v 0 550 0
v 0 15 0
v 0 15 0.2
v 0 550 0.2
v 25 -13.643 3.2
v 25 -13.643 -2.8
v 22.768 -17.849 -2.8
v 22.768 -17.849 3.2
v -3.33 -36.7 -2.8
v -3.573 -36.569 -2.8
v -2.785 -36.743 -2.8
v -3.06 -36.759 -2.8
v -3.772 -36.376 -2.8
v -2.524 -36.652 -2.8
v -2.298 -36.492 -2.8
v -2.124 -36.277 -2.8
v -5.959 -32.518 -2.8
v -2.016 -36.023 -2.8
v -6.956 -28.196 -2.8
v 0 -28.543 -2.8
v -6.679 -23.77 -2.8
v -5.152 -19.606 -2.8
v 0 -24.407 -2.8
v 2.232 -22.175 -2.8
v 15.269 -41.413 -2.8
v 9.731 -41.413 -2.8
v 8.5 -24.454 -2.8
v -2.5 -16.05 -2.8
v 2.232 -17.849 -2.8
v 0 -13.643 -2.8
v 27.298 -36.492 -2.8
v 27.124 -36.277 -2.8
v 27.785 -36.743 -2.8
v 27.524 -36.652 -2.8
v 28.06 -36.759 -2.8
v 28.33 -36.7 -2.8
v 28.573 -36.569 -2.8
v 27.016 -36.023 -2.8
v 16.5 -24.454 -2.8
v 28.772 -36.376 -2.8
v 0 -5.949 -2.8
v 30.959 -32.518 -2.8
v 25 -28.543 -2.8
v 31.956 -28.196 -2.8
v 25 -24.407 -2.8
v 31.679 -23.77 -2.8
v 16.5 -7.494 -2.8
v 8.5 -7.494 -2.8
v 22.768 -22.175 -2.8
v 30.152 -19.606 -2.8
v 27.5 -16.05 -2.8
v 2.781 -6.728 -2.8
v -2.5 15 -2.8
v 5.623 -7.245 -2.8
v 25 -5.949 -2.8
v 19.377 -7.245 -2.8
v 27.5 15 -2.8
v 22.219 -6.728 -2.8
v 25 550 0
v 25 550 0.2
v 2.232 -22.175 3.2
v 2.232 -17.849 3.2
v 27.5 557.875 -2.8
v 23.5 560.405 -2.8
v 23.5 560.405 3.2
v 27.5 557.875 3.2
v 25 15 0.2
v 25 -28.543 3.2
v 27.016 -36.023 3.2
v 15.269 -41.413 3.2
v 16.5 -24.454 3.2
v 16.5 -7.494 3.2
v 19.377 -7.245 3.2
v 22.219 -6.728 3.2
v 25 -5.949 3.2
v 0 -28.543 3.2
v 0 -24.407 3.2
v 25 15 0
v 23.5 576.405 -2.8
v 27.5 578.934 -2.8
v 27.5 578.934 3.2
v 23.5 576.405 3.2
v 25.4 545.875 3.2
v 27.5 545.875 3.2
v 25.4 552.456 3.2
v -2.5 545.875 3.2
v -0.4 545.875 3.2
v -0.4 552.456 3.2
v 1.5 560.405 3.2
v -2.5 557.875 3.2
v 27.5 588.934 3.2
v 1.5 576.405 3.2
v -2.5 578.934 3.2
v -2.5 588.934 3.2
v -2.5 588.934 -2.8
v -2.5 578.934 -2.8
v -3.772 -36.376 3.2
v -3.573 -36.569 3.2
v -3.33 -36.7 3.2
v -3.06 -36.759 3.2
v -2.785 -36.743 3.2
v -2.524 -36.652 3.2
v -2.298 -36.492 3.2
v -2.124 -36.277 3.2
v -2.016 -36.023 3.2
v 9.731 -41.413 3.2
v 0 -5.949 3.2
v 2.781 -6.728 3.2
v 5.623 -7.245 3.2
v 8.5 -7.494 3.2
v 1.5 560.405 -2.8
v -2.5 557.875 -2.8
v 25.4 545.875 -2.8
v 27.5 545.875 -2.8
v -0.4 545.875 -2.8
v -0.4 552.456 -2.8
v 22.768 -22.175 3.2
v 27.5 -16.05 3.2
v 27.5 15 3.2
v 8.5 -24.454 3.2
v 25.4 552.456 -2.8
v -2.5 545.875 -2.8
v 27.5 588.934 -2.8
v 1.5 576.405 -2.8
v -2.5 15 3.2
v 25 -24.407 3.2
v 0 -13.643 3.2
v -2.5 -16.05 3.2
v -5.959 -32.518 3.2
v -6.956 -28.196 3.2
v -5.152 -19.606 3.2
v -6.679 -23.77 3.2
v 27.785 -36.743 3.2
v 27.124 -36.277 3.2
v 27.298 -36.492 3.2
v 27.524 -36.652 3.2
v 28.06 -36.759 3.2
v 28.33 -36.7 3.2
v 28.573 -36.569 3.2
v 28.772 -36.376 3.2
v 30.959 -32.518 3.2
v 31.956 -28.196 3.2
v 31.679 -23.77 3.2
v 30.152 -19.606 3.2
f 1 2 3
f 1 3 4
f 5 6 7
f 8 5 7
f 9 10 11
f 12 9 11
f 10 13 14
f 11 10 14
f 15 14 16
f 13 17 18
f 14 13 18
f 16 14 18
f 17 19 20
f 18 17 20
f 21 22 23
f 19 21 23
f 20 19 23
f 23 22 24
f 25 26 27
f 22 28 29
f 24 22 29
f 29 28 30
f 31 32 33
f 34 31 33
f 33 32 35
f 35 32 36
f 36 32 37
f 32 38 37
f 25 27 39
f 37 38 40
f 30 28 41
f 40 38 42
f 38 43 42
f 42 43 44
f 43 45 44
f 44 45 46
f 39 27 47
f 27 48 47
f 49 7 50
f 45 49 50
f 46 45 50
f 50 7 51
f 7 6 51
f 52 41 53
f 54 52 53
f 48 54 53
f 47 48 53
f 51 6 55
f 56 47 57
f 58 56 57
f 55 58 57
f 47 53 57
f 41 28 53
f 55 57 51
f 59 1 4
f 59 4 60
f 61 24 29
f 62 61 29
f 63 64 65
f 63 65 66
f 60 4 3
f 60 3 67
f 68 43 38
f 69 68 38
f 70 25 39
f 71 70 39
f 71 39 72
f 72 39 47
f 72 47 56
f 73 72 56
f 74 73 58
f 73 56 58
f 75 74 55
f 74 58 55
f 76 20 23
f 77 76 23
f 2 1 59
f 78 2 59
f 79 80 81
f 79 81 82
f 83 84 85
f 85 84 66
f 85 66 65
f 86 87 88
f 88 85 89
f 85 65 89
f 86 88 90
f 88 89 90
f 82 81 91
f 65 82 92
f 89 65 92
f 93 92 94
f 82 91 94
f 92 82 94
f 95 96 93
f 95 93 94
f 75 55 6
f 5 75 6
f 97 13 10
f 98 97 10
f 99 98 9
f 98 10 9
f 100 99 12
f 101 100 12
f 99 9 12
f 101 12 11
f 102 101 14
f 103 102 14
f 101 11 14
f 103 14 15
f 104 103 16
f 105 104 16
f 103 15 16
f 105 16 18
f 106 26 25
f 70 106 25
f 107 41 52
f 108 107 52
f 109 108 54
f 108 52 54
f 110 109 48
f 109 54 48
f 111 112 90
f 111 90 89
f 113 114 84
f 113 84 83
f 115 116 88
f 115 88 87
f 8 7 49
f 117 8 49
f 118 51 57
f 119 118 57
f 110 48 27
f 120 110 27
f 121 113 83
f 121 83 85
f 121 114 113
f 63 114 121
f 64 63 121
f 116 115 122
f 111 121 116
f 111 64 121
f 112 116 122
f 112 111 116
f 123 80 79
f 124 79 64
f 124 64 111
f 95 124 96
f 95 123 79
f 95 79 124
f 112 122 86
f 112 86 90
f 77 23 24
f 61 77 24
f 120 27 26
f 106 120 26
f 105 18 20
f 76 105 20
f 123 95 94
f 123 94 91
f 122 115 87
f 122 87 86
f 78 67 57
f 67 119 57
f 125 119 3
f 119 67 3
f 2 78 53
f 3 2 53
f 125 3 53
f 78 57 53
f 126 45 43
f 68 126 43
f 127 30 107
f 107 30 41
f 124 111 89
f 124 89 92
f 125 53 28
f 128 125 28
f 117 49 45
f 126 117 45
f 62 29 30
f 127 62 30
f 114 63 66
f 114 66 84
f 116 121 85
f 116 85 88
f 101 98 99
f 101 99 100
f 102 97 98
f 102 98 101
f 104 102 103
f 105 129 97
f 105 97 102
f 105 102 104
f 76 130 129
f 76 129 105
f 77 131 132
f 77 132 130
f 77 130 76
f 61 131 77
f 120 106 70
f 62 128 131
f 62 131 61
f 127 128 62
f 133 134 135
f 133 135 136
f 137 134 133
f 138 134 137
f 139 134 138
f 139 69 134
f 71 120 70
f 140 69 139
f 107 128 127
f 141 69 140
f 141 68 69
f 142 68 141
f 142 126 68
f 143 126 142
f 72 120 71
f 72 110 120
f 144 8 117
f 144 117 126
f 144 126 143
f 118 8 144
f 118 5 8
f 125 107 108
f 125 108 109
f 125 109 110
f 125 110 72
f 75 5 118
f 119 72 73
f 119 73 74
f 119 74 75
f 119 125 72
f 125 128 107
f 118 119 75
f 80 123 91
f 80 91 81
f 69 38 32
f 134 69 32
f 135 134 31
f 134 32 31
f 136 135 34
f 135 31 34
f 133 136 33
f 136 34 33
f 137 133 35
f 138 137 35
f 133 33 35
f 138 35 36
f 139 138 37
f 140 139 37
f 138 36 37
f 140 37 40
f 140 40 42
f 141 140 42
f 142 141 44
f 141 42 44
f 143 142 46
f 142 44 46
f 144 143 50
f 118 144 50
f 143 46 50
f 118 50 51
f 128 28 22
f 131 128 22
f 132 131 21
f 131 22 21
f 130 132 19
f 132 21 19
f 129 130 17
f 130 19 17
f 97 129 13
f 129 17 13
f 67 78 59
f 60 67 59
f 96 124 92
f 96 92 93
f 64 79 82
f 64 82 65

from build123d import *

# Parameters (mm, degrees)
ESQUISSE1_W           = 25
ESQUISSE1_H           = 550
EXTRUSION1_DEPTH      = 0.2
EXTRUSION2_DEPTH      = 3
EXTRUSION2_DEPTH_BACK = 3
EXTRUSION3_DEPTH      = 3
EXTRUSION3_DEPTH_BACK = 3


with BuildPart() as part:
    # Esquisse1 → Extrusion1 (new body)
    with BuildSketch(Plane.XY):
        with Locations((12.5, 275)):
            Rectangle(ESQUISSE1_W, ESQUISSE1_H)
    extrude(amount=EXTRUSION1_DEPTH)

    # Esquisse3 → Extrusion3 (add, two sides: drawn at the far end of the back side and taken through both)
    with BuildSketch(Plane.XY.offset(0.2).offset(-EXTRUSION3_DEPTH_BACK)):
        with BuildLine():
            Line((-2.5, 15), (-2.5, -16.050493534))
            ThreePointArc((-2.5, -16.050493534), (-6.978018175, -25.972905965), (-3.771522068, -36.376044816))
            ThreePointArc((-3.771522068, -36.376044816), (-2.784540643, -36.74292693), (-2.016270834, -36.022860045))
            Line((-2.016270834, -36.022860045), (0, -28.543432251))
            Line((0, -28.543432251), (0, -24.40673249))
            Line((0, -24.40673249), (2.231996633, -22.174735857))
            Line((2.231996633, -22.174735857), (2.231996633, -17.848828872))
            Line((2.231996633, -17.848828872), (0, -13.643085971))
            Line((0, -13.643085971), (0, -5.949496262))
            ThreePointArc((0, -5.949496262), (4.195848556, -7.019821856), (8.5, -7.494187032))
            Line((8.5, -7.494187032), (8.5, -24.453508065))
            Line((8.5, -24.453508065), (9.730786536, -41.412829098))
            Line((9.730786536, -41.412829098), (15.269213464, -41.412829098))
            Line((15.269213464, -41.412829098), (16.5, -24.453508065))
            Line((16.5, -24.453508065), (16.5, -7.494187032))
            ThreePointArc((16.5, -7.494187032), (20.804151444, -7.019821856), (25, -5.949496262))
            Line((25, -5.949496262), (25, -13.643085971))
            Line((25, -13.643085971), (22.768003367, -17.848828872))
            Line((22.768003367, -17.848828872), (22.768003367, -22.174735857))
            Line((22.768003367, -22.174735857), (25, -24.40673249))
            Line((25, -24.40673249), (25, -28.543432251))
            Line((25, -28.543432251), (27.016270834, -36.022860045))
            ThreePointArc((27.016270834, -36.022860045), (27.784540643, -36.74292693), (28.771522068, -36.376044816))
            ThreePointArc((28.771522068, -36.376044816), (31.978018175, -25.972905965), (27.5, -16.050493534))
            Line((27.5, -16.050493534), (27.5, 15))
            Line((27.5, 15), (-2.5, 15))
        make_face()
    extrude(amount=EXTRUSION3_DEPTH + EXTRUSION3_DEPTH_BACK)


with BuildPart() as body_2:
    # Esquisse2 → Extrusion2 (new, two sides: drawn at the far end of the back side and taken through both)
    with BuildSketch(Plane.XY.offset(0.2).offset(-EXTRUSION2_DEPTH_BACK)):
        Polygon((-2.5, 545.875442138), (-2.5, 557.875442138), (1.5, 560.404747727), (1.5, 576.404747727), (-2.5, 578.934053316), (-2.5, 588.934053316), (27.5, 588.934053316), (27.5, 578.934053316), (23.5, 576.404747727), (23.5, 560.404747727), (27.5, 557.875442138), (27.5, 545.875442138), (25.400146352, 545.875442138), (25.400146352, 552.456132333), (-0.400146352, 552.456132333), (-0.400146352, 545.875442138), align=None)
    extrude(amount=EXTRUSION2_DEPTH + EXTRUSION2_DEPTH_BACK)


solid = Compound([part.part, body_2.part])
